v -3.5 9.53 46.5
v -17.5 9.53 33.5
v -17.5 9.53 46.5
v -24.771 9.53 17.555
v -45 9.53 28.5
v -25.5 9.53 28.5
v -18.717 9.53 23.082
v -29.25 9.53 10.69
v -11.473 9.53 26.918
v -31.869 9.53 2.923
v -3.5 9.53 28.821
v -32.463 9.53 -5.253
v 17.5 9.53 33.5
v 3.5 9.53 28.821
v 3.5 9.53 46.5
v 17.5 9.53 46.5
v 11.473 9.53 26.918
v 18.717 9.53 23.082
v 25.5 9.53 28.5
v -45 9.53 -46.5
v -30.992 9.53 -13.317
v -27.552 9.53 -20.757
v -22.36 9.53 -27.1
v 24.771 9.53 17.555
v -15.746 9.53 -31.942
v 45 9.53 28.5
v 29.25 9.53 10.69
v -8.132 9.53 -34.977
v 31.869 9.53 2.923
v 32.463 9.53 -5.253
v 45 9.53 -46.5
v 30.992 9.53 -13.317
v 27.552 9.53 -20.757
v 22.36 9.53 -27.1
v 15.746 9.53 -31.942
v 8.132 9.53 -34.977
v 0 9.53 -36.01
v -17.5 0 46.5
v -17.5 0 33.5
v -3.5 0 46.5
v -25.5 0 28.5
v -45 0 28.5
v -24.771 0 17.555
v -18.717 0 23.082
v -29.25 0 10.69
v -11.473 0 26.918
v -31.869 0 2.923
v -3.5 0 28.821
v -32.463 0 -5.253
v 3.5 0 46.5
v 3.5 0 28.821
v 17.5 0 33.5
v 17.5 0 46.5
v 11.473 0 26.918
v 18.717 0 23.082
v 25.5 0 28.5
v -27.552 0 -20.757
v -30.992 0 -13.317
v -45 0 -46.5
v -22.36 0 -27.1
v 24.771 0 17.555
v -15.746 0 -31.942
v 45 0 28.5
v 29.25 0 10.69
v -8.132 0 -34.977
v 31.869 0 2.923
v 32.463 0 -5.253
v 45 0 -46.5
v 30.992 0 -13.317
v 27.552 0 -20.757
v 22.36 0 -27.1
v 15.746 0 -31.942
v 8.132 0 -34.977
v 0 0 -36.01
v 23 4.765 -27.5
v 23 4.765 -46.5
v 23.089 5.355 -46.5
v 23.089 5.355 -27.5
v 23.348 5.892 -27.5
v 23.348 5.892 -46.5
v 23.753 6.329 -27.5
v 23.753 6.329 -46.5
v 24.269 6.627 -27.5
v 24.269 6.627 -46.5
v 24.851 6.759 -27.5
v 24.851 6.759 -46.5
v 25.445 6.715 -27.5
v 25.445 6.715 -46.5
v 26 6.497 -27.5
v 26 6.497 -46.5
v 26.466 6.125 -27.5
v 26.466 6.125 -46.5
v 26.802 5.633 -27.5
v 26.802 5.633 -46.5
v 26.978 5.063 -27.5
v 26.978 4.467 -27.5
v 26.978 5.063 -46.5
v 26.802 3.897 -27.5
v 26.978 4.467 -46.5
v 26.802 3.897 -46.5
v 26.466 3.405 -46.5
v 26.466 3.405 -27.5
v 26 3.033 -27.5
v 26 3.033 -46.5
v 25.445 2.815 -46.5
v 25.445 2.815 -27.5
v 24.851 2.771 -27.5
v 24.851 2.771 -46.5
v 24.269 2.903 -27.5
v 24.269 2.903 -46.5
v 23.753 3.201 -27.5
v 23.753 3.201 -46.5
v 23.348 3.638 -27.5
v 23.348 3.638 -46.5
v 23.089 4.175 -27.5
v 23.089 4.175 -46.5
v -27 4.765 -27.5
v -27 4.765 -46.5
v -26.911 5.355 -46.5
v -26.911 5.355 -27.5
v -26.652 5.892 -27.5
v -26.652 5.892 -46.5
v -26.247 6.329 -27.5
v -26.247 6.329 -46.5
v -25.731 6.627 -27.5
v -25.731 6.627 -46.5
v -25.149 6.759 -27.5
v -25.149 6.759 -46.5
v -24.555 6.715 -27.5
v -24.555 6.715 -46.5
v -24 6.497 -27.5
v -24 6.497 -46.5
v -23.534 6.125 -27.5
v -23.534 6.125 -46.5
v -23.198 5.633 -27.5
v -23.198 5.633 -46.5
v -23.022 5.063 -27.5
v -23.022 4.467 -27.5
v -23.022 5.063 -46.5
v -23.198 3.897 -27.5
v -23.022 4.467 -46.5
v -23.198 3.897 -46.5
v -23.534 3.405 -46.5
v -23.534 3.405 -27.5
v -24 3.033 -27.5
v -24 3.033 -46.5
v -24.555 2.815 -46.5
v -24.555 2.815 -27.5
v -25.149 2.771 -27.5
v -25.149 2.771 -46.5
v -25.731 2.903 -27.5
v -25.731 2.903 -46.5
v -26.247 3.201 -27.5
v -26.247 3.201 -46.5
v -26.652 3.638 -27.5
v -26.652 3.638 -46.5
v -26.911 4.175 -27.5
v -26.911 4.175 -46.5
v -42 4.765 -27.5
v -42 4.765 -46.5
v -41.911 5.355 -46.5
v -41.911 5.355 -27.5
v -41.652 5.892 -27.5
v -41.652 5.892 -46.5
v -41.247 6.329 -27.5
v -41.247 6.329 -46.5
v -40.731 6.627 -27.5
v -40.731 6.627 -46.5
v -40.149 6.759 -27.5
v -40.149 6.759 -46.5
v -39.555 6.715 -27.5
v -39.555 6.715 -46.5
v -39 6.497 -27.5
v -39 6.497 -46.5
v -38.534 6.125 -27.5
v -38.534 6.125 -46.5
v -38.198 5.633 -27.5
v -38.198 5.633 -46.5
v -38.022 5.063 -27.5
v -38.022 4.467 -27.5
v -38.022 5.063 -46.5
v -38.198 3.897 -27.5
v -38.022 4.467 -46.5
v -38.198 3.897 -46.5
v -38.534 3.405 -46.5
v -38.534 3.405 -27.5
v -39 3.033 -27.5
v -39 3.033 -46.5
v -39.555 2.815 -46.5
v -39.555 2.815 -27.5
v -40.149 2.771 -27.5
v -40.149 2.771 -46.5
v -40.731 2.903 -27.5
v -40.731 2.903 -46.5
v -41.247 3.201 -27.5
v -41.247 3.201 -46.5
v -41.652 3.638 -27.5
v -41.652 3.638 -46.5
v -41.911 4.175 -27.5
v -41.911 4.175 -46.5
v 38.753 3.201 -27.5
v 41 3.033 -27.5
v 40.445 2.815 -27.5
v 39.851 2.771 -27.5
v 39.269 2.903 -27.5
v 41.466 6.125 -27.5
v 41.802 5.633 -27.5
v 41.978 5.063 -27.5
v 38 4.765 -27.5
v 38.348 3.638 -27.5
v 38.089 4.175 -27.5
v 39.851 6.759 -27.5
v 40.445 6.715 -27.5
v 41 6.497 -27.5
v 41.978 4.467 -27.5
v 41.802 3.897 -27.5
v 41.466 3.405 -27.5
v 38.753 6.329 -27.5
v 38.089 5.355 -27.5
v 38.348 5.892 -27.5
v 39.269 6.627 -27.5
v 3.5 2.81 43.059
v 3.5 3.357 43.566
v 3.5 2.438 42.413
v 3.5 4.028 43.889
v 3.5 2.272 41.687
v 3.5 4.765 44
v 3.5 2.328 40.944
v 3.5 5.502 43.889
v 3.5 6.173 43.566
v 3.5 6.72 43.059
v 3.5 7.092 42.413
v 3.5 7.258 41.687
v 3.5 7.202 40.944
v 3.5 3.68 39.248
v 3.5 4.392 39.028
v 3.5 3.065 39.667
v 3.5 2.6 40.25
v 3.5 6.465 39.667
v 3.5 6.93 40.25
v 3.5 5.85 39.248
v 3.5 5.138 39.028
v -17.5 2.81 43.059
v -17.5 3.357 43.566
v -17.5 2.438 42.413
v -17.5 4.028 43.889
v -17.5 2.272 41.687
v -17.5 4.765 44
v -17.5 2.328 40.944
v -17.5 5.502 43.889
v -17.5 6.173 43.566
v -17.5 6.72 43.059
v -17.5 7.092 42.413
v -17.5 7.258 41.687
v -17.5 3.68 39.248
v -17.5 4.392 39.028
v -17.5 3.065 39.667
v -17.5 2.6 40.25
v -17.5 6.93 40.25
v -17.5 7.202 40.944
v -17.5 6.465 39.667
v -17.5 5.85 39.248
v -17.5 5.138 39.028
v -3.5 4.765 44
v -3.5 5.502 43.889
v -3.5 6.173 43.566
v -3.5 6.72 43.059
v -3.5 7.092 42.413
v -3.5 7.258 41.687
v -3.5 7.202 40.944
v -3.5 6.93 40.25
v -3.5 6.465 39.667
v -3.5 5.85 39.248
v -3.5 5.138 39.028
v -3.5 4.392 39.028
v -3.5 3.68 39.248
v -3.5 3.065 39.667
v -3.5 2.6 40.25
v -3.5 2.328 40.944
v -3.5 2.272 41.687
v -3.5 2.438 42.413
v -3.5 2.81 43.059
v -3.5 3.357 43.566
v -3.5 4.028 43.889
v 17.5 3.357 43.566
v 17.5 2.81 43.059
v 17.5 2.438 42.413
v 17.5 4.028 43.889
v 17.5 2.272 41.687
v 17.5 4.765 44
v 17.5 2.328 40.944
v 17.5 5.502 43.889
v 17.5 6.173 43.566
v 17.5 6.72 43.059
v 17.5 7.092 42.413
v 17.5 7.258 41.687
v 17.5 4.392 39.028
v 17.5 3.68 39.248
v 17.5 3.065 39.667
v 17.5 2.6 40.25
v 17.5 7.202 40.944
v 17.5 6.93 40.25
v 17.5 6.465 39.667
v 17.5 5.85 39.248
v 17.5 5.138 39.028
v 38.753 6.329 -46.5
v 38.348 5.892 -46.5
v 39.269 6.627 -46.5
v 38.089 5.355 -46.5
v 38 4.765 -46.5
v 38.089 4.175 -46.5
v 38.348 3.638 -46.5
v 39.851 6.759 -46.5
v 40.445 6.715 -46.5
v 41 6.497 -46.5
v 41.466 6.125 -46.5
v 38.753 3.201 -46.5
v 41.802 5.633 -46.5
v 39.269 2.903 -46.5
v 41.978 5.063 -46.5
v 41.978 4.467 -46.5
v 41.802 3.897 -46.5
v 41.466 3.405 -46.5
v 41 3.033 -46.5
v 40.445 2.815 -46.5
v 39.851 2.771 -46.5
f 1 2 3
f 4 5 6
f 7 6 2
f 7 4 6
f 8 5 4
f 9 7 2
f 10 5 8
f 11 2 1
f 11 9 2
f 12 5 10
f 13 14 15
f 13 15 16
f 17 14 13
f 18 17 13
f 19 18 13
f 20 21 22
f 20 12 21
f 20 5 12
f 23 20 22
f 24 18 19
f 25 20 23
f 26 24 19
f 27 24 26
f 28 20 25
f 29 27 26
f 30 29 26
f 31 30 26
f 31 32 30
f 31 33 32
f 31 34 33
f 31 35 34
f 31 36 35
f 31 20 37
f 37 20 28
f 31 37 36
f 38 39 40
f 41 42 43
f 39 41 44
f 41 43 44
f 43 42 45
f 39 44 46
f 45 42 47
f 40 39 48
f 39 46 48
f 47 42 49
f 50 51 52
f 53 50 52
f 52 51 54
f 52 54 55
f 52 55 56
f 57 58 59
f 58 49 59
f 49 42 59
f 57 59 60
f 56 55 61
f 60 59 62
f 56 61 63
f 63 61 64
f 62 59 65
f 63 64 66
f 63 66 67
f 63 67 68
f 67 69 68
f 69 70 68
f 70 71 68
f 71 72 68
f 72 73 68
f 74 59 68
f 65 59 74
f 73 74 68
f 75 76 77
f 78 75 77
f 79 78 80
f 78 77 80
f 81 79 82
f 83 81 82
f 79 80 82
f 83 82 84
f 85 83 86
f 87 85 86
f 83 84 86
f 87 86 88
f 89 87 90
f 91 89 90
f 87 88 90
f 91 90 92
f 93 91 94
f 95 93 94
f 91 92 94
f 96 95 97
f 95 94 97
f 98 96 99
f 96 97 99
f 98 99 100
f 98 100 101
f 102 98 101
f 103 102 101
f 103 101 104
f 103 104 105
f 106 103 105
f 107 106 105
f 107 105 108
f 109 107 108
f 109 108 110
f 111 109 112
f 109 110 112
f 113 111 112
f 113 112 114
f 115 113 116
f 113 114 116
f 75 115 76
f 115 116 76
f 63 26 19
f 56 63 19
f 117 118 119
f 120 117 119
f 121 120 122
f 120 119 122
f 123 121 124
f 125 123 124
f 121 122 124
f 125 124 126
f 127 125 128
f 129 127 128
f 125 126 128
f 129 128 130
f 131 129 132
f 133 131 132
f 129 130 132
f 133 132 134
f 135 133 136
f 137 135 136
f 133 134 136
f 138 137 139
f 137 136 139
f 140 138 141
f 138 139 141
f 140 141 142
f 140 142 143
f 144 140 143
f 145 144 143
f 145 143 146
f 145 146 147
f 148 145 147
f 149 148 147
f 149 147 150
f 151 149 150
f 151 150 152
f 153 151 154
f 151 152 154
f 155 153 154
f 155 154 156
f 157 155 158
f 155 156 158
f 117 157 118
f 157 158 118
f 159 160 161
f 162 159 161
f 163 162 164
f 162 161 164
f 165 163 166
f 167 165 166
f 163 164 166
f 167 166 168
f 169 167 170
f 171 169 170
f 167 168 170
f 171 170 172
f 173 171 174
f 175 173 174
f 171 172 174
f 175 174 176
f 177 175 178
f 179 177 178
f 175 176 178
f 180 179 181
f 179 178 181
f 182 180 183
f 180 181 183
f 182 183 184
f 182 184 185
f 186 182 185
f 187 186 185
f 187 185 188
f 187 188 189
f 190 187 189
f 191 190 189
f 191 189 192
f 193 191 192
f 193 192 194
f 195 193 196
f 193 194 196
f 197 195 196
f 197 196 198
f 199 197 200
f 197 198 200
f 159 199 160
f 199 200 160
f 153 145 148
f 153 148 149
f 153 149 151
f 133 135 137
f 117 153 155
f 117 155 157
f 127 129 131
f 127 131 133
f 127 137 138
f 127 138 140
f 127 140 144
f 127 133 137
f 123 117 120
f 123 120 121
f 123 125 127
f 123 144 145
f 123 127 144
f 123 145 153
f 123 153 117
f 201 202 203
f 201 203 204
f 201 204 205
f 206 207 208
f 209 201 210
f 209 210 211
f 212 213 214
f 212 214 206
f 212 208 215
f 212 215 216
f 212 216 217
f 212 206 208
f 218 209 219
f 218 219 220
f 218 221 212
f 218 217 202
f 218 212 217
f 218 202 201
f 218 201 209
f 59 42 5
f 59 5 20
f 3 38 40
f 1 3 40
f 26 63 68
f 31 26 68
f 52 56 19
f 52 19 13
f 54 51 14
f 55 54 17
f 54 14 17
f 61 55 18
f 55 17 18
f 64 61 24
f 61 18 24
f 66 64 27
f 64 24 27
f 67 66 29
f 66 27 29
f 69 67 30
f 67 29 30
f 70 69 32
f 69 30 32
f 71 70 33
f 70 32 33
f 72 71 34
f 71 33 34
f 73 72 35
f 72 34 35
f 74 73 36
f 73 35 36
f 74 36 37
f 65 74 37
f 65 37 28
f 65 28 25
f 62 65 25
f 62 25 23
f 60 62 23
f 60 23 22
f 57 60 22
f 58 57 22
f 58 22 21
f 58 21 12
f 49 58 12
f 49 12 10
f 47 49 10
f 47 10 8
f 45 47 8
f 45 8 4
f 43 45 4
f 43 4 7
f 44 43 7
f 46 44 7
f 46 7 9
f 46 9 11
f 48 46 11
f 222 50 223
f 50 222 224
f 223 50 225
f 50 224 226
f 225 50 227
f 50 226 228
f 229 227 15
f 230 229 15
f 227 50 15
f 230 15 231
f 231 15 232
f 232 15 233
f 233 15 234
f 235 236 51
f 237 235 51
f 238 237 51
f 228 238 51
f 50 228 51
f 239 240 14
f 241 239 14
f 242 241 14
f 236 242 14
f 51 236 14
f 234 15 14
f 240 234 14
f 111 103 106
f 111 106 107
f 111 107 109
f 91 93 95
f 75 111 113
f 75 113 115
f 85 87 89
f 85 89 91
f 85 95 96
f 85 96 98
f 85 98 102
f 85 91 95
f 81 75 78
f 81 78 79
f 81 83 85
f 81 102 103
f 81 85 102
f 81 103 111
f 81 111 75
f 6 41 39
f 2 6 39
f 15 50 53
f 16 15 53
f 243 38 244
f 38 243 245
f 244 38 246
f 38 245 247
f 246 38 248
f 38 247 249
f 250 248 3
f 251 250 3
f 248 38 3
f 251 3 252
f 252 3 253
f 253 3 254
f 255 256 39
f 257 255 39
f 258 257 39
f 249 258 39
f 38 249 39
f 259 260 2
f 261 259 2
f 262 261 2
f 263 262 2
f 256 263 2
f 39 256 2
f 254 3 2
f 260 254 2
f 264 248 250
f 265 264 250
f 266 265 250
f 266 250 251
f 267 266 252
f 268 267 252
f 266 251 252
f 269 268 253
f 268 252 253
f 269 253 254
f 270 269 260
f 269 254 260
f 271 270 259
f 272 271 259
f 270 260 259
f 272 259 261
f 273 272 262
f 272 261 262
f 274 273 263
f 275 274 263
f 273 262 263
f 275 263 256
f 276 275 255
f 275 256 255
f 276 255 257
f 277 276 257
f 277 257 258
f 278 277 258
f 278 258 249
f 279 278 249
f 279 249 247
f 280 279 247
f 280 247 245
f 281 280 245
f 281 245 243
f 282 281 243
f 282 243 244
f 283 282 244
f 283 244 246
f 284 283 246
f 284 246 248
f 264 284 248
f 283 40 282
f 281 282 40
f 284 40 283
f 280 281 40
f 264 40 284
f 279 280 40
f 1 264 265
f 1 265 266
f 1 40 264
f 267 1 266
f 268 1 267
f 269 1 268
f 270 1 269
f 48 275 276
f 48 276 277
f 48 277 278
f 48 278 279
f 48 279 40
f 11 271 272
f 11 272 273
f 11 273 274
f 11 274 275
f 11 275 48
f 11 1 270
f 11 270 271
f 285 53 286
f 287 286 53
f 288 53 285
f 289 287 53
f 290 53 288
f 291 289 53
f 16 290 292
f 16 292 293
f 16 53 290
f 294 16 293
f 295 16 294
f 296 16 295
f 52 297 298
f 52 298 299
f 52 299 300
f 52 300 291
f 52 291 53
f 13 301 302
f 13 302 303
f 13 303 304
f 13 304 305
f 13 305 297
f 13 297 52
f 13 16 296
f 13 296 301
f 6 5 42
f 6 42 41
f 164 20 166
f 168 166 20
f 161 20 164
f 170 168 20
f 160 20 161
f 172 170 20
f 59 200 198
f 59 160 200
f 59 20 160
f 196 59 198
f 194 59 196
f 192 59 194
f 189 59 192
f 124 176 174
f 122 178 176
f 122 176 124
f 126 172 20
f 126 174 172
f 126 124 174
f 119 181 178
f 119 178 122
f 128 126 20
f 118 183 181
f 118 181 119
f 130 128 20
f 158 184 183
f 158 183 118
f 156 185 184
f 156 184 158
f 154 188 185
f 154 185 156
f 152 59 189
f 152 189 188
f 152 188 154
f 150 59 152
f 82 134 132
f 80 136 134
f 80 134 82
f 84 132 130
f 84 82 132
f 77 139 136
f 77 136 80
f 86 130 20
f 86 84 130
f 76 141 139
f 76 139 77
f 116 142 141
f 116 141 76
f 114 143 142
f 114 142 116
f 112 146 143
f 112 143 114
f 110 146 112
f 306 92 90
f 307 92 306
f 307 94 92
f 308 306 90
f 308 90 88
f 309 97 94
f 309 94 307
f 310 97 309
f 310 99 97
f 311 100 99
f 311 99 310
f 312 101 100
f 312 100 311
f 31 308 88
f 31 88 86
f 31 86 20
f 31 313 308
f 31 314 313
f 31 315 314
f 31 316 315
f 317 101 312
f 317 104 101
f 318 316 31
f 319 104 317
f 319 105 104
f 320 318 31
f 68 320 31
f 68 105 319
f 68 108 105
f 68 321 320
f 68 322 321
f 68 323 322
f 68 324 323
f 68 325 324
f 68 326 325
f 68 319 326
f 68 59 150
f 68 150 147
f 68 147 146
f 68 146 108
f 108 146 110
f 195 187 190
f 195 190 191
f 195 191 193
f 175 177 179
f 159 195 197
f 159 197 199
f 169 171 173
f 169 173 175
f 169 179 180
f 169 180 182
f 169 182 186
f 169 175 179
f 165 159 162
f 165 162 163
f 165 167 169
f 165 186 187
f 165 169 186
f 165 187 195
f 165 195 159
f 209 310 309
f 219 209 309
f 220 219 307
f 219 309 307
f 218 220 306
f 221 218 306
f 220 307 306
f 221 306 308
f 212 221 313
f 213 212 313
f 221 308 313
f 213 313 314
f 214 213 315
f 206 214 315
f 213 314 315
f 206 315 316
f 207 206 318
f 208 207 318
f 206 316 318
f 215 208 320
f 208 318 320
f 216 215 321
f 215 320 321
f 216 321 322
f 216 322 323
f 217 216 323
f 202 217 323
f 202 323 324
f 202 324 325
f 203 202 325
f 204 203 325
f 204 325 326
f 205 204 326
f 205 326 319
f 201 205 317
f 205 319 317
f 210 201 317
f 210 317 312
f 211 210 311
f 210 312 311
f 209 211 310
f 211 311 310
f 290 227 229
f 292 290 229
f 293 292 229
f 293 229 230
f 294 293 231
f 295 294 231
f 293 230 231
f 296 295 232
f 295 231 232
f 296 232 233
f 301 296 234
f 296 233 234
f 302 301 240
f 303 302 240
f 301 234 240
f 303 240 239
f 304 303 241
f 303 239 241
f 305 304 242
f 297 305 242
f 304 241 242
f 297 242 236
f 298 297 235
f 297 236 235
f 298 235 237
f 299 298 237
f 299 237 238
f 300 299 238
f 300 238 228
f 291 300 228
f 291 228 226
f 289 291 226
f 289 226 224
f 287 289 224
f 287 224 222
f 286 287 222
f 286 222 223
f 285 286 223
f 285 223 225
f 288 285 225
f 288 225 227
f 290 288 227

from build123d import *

# Parameters (mm, degrees)
ESBO_O1_W                = 90
ESBO_O1_H                = 93
RESSALTO_EXTRUS_O1_DEPTH = 9.53
ESBO_O3_R                = 32.51
CORTE_EXTRUS_O2_DEPTH    = 66.406963697
ESBO_O2_R                = 2
CORTE_EXTRUS_O1_DEPTH    = 19
CORTE_EXTRUS_O4_REACH    = 67.407
ESBO_O5_W                = 27.5
ESBO_O5_H                = 13
CORTE_EXTRUS_O5_REACH    = 67.407
ESBO_O6_W                = 7
ESBO_O6_H                = 26.329700269
CORTE_EXTRUS_O6_REACH    = 80.481
ESBO_O7_R                = 2.5
CORTE_EXTRUS_O8_DEPTH    = 66.406963697


with BuildPart() as part:
    # Esboço1 → Ressalto-extrusão1 (new body)
    with BuildSketch(Plane(origin=(0, 0, 0), x_dir=(1, 0, 0), z_dir=(0, 1, 0))):
        Rectangle(ESBO_O1_W, ESBO_O1_H)
    extrude(amount=RESSALTO_EXTRUS_O1_DEPTH)

    # Esboço3 → Corte-extrusão2 (cut, through all)
    with BuildSketch(Plane(origin=(0, 9.53, 0), x_dir=(1, 0, 0), z_dir=(0, 1, 0))):
        with Locations(Location((0, 3.5, 0), (0, 0, 270))):
            Circle(ESBO_O3_R)
    extrude(amount=-CORTE_EXTRUS_O2_DEPTH, mode=Mode.SUBTRACT)

    # Esboço2 → Corte-extrusão1 (cut)
    with BuildSketch(Plane(origin=(0, 0, -46.5), x_dir=(-1, 0, 0), z_dir=(0, 0, -1))):
        with Locations((-40, 4.765)):
            Circle(ESBO_O2_R)
        with Locations((-25, 4.765)):
            Circle(ESBO_O2_R)
        with Locations((25, 4.765)):
            Circle(ESBO_O2_R)
        with Locations((40, 4.765)):
            Circle(ESBO_O2_R)
    extrude(amount=-CORTE_EXTRUS_O1_DEPTH, mode=Mode.SUBTRACT)

    # Esboço5 → Corte-extrusão4 (cut, up to next)
    with BuildSketch(Plane(origin=(0, 9.53, 0), x_dir=(1, 0, 0), z_dir=(0, 1, 0)), mode=Mode.PRIVATE) as corte_extrus_o4_sk1:
        with Locations((31.25, -40)):
            Rectangle(ESBO_O5_W, ESBO_O5_H)
    corte_extrus_o4_tool1 = extrude(corte_extrus_o4_sk1.sketch, amount=-CORTE_EXTRUS_O4_REACH, mode=Mode.PRIVATE) & part.part
    # Esboço5 → Corte-extrusão4 (cut, up to next)
    with BuildSketch(Plane(origin=(0, 9.53, 0), x_dir=(1, 0, 0), z_dir=(0, 1, 0)), mode=Mode.PRIVATE) as corte_extrus_o4_sk2:
        with Locations((-31.25, -40)):
            Rectangle(ESBO_O5_W, ESBO_O5_H)
    corte_extrus_o4_tool2 = extrude(corte_extrus_o4_sk2.sketch, amount=-CORTE_EXTRUS_O4_REACH, mode=Mode.PRIVATE) & part.part
    add(corte_extrus_o4_tool1.solids().sort_by_distance((31.25, 9.53, 40))[0], mode=Mode.SUBTRACT)
    add(corte_extrus_o4_tool2.solids().sort_by_distance((-31.25, 9.53, 40))[0], mode=Mode.SUBTRACT)

    # Esboço6 → Corte-extrusão5 (cut, up to next)
    with BuildSketch(Plane(origin=(0, 9.53, 0), x_dir=(1, 0, 0), z_dir=(0, 1, 0)), mode=Mode.PRIVATE) as corte_extrus_o5_sk1:
        with Locations((0, -33.335149866)):
            Rectangle(ESBO_O6_W, ESBO_O6_H)
    corte_extrus_o5_tool1 = extrude(corte_extrus_o5_sk1.sketch, amount=-CORTE_EXTRUS_O5_REACH, mode=Mode.PRIVATE) & part.part
    add(corte_extrus_o5_tool1.solids().sort_by_distance((0, 9.53, 33.33515))[0], mode=Mode.SUBTRACT)

    # Corte-extrusão6: up to this face of the body (flat: up to its plane)
    corte_extrus_o6_end = Plane(part.part.faces().sort_by_distance((17.5, 4.765, 40))[0])
    # Esboço7 → Corte-extrusão6 (cut, up to the picked face)
    with BuildSketch(Plane.ZY.offset(17.5), mode=Mode.PRIVATE) as corte_extrus_o6_sk1:
        with Locations((41.5, 4.765)):
            Circle(ESBO_O7_R)
    corte_extrus_o6_tool1 = split(extrude(corte_extrus_o6_sk1.sketch, amount=-CORTE_EXTRUS_O6_REACH, mode=Mode.PRIVATE), bisect_by=corte_extrus_o6_end, keep=Keep.BOTH, mode=Mode.PRIVATE)
    add(corte_extrus_o6_tool1.solids().sort_by(Axis((-17.5, 4.765, 41.5), (1, 0, 0)))[0], mode=Mode.SUBTRACT)

    # Esboço9 → Corte-extrusão8 (cut, through all)
    with BuildSketch(Plane(origin=(0, 9.53, 0), x_dir=(-1, 0, 0), z_dir=(0, 1, 0))):
        Polygon((45, 28.5), (25.5, 28.5), (17.5, 33.5), (45, 33.5), align=None)
        Polygon((-25.5, 28.5), (-17.5, 33.5), (-45, 33.5), (-45, 28.5), align=None)
    extrude(amount=-CORTE_EXTRUS_O8_DEPTH, mode=Mode.SUBTRACT)


solid = part.part
